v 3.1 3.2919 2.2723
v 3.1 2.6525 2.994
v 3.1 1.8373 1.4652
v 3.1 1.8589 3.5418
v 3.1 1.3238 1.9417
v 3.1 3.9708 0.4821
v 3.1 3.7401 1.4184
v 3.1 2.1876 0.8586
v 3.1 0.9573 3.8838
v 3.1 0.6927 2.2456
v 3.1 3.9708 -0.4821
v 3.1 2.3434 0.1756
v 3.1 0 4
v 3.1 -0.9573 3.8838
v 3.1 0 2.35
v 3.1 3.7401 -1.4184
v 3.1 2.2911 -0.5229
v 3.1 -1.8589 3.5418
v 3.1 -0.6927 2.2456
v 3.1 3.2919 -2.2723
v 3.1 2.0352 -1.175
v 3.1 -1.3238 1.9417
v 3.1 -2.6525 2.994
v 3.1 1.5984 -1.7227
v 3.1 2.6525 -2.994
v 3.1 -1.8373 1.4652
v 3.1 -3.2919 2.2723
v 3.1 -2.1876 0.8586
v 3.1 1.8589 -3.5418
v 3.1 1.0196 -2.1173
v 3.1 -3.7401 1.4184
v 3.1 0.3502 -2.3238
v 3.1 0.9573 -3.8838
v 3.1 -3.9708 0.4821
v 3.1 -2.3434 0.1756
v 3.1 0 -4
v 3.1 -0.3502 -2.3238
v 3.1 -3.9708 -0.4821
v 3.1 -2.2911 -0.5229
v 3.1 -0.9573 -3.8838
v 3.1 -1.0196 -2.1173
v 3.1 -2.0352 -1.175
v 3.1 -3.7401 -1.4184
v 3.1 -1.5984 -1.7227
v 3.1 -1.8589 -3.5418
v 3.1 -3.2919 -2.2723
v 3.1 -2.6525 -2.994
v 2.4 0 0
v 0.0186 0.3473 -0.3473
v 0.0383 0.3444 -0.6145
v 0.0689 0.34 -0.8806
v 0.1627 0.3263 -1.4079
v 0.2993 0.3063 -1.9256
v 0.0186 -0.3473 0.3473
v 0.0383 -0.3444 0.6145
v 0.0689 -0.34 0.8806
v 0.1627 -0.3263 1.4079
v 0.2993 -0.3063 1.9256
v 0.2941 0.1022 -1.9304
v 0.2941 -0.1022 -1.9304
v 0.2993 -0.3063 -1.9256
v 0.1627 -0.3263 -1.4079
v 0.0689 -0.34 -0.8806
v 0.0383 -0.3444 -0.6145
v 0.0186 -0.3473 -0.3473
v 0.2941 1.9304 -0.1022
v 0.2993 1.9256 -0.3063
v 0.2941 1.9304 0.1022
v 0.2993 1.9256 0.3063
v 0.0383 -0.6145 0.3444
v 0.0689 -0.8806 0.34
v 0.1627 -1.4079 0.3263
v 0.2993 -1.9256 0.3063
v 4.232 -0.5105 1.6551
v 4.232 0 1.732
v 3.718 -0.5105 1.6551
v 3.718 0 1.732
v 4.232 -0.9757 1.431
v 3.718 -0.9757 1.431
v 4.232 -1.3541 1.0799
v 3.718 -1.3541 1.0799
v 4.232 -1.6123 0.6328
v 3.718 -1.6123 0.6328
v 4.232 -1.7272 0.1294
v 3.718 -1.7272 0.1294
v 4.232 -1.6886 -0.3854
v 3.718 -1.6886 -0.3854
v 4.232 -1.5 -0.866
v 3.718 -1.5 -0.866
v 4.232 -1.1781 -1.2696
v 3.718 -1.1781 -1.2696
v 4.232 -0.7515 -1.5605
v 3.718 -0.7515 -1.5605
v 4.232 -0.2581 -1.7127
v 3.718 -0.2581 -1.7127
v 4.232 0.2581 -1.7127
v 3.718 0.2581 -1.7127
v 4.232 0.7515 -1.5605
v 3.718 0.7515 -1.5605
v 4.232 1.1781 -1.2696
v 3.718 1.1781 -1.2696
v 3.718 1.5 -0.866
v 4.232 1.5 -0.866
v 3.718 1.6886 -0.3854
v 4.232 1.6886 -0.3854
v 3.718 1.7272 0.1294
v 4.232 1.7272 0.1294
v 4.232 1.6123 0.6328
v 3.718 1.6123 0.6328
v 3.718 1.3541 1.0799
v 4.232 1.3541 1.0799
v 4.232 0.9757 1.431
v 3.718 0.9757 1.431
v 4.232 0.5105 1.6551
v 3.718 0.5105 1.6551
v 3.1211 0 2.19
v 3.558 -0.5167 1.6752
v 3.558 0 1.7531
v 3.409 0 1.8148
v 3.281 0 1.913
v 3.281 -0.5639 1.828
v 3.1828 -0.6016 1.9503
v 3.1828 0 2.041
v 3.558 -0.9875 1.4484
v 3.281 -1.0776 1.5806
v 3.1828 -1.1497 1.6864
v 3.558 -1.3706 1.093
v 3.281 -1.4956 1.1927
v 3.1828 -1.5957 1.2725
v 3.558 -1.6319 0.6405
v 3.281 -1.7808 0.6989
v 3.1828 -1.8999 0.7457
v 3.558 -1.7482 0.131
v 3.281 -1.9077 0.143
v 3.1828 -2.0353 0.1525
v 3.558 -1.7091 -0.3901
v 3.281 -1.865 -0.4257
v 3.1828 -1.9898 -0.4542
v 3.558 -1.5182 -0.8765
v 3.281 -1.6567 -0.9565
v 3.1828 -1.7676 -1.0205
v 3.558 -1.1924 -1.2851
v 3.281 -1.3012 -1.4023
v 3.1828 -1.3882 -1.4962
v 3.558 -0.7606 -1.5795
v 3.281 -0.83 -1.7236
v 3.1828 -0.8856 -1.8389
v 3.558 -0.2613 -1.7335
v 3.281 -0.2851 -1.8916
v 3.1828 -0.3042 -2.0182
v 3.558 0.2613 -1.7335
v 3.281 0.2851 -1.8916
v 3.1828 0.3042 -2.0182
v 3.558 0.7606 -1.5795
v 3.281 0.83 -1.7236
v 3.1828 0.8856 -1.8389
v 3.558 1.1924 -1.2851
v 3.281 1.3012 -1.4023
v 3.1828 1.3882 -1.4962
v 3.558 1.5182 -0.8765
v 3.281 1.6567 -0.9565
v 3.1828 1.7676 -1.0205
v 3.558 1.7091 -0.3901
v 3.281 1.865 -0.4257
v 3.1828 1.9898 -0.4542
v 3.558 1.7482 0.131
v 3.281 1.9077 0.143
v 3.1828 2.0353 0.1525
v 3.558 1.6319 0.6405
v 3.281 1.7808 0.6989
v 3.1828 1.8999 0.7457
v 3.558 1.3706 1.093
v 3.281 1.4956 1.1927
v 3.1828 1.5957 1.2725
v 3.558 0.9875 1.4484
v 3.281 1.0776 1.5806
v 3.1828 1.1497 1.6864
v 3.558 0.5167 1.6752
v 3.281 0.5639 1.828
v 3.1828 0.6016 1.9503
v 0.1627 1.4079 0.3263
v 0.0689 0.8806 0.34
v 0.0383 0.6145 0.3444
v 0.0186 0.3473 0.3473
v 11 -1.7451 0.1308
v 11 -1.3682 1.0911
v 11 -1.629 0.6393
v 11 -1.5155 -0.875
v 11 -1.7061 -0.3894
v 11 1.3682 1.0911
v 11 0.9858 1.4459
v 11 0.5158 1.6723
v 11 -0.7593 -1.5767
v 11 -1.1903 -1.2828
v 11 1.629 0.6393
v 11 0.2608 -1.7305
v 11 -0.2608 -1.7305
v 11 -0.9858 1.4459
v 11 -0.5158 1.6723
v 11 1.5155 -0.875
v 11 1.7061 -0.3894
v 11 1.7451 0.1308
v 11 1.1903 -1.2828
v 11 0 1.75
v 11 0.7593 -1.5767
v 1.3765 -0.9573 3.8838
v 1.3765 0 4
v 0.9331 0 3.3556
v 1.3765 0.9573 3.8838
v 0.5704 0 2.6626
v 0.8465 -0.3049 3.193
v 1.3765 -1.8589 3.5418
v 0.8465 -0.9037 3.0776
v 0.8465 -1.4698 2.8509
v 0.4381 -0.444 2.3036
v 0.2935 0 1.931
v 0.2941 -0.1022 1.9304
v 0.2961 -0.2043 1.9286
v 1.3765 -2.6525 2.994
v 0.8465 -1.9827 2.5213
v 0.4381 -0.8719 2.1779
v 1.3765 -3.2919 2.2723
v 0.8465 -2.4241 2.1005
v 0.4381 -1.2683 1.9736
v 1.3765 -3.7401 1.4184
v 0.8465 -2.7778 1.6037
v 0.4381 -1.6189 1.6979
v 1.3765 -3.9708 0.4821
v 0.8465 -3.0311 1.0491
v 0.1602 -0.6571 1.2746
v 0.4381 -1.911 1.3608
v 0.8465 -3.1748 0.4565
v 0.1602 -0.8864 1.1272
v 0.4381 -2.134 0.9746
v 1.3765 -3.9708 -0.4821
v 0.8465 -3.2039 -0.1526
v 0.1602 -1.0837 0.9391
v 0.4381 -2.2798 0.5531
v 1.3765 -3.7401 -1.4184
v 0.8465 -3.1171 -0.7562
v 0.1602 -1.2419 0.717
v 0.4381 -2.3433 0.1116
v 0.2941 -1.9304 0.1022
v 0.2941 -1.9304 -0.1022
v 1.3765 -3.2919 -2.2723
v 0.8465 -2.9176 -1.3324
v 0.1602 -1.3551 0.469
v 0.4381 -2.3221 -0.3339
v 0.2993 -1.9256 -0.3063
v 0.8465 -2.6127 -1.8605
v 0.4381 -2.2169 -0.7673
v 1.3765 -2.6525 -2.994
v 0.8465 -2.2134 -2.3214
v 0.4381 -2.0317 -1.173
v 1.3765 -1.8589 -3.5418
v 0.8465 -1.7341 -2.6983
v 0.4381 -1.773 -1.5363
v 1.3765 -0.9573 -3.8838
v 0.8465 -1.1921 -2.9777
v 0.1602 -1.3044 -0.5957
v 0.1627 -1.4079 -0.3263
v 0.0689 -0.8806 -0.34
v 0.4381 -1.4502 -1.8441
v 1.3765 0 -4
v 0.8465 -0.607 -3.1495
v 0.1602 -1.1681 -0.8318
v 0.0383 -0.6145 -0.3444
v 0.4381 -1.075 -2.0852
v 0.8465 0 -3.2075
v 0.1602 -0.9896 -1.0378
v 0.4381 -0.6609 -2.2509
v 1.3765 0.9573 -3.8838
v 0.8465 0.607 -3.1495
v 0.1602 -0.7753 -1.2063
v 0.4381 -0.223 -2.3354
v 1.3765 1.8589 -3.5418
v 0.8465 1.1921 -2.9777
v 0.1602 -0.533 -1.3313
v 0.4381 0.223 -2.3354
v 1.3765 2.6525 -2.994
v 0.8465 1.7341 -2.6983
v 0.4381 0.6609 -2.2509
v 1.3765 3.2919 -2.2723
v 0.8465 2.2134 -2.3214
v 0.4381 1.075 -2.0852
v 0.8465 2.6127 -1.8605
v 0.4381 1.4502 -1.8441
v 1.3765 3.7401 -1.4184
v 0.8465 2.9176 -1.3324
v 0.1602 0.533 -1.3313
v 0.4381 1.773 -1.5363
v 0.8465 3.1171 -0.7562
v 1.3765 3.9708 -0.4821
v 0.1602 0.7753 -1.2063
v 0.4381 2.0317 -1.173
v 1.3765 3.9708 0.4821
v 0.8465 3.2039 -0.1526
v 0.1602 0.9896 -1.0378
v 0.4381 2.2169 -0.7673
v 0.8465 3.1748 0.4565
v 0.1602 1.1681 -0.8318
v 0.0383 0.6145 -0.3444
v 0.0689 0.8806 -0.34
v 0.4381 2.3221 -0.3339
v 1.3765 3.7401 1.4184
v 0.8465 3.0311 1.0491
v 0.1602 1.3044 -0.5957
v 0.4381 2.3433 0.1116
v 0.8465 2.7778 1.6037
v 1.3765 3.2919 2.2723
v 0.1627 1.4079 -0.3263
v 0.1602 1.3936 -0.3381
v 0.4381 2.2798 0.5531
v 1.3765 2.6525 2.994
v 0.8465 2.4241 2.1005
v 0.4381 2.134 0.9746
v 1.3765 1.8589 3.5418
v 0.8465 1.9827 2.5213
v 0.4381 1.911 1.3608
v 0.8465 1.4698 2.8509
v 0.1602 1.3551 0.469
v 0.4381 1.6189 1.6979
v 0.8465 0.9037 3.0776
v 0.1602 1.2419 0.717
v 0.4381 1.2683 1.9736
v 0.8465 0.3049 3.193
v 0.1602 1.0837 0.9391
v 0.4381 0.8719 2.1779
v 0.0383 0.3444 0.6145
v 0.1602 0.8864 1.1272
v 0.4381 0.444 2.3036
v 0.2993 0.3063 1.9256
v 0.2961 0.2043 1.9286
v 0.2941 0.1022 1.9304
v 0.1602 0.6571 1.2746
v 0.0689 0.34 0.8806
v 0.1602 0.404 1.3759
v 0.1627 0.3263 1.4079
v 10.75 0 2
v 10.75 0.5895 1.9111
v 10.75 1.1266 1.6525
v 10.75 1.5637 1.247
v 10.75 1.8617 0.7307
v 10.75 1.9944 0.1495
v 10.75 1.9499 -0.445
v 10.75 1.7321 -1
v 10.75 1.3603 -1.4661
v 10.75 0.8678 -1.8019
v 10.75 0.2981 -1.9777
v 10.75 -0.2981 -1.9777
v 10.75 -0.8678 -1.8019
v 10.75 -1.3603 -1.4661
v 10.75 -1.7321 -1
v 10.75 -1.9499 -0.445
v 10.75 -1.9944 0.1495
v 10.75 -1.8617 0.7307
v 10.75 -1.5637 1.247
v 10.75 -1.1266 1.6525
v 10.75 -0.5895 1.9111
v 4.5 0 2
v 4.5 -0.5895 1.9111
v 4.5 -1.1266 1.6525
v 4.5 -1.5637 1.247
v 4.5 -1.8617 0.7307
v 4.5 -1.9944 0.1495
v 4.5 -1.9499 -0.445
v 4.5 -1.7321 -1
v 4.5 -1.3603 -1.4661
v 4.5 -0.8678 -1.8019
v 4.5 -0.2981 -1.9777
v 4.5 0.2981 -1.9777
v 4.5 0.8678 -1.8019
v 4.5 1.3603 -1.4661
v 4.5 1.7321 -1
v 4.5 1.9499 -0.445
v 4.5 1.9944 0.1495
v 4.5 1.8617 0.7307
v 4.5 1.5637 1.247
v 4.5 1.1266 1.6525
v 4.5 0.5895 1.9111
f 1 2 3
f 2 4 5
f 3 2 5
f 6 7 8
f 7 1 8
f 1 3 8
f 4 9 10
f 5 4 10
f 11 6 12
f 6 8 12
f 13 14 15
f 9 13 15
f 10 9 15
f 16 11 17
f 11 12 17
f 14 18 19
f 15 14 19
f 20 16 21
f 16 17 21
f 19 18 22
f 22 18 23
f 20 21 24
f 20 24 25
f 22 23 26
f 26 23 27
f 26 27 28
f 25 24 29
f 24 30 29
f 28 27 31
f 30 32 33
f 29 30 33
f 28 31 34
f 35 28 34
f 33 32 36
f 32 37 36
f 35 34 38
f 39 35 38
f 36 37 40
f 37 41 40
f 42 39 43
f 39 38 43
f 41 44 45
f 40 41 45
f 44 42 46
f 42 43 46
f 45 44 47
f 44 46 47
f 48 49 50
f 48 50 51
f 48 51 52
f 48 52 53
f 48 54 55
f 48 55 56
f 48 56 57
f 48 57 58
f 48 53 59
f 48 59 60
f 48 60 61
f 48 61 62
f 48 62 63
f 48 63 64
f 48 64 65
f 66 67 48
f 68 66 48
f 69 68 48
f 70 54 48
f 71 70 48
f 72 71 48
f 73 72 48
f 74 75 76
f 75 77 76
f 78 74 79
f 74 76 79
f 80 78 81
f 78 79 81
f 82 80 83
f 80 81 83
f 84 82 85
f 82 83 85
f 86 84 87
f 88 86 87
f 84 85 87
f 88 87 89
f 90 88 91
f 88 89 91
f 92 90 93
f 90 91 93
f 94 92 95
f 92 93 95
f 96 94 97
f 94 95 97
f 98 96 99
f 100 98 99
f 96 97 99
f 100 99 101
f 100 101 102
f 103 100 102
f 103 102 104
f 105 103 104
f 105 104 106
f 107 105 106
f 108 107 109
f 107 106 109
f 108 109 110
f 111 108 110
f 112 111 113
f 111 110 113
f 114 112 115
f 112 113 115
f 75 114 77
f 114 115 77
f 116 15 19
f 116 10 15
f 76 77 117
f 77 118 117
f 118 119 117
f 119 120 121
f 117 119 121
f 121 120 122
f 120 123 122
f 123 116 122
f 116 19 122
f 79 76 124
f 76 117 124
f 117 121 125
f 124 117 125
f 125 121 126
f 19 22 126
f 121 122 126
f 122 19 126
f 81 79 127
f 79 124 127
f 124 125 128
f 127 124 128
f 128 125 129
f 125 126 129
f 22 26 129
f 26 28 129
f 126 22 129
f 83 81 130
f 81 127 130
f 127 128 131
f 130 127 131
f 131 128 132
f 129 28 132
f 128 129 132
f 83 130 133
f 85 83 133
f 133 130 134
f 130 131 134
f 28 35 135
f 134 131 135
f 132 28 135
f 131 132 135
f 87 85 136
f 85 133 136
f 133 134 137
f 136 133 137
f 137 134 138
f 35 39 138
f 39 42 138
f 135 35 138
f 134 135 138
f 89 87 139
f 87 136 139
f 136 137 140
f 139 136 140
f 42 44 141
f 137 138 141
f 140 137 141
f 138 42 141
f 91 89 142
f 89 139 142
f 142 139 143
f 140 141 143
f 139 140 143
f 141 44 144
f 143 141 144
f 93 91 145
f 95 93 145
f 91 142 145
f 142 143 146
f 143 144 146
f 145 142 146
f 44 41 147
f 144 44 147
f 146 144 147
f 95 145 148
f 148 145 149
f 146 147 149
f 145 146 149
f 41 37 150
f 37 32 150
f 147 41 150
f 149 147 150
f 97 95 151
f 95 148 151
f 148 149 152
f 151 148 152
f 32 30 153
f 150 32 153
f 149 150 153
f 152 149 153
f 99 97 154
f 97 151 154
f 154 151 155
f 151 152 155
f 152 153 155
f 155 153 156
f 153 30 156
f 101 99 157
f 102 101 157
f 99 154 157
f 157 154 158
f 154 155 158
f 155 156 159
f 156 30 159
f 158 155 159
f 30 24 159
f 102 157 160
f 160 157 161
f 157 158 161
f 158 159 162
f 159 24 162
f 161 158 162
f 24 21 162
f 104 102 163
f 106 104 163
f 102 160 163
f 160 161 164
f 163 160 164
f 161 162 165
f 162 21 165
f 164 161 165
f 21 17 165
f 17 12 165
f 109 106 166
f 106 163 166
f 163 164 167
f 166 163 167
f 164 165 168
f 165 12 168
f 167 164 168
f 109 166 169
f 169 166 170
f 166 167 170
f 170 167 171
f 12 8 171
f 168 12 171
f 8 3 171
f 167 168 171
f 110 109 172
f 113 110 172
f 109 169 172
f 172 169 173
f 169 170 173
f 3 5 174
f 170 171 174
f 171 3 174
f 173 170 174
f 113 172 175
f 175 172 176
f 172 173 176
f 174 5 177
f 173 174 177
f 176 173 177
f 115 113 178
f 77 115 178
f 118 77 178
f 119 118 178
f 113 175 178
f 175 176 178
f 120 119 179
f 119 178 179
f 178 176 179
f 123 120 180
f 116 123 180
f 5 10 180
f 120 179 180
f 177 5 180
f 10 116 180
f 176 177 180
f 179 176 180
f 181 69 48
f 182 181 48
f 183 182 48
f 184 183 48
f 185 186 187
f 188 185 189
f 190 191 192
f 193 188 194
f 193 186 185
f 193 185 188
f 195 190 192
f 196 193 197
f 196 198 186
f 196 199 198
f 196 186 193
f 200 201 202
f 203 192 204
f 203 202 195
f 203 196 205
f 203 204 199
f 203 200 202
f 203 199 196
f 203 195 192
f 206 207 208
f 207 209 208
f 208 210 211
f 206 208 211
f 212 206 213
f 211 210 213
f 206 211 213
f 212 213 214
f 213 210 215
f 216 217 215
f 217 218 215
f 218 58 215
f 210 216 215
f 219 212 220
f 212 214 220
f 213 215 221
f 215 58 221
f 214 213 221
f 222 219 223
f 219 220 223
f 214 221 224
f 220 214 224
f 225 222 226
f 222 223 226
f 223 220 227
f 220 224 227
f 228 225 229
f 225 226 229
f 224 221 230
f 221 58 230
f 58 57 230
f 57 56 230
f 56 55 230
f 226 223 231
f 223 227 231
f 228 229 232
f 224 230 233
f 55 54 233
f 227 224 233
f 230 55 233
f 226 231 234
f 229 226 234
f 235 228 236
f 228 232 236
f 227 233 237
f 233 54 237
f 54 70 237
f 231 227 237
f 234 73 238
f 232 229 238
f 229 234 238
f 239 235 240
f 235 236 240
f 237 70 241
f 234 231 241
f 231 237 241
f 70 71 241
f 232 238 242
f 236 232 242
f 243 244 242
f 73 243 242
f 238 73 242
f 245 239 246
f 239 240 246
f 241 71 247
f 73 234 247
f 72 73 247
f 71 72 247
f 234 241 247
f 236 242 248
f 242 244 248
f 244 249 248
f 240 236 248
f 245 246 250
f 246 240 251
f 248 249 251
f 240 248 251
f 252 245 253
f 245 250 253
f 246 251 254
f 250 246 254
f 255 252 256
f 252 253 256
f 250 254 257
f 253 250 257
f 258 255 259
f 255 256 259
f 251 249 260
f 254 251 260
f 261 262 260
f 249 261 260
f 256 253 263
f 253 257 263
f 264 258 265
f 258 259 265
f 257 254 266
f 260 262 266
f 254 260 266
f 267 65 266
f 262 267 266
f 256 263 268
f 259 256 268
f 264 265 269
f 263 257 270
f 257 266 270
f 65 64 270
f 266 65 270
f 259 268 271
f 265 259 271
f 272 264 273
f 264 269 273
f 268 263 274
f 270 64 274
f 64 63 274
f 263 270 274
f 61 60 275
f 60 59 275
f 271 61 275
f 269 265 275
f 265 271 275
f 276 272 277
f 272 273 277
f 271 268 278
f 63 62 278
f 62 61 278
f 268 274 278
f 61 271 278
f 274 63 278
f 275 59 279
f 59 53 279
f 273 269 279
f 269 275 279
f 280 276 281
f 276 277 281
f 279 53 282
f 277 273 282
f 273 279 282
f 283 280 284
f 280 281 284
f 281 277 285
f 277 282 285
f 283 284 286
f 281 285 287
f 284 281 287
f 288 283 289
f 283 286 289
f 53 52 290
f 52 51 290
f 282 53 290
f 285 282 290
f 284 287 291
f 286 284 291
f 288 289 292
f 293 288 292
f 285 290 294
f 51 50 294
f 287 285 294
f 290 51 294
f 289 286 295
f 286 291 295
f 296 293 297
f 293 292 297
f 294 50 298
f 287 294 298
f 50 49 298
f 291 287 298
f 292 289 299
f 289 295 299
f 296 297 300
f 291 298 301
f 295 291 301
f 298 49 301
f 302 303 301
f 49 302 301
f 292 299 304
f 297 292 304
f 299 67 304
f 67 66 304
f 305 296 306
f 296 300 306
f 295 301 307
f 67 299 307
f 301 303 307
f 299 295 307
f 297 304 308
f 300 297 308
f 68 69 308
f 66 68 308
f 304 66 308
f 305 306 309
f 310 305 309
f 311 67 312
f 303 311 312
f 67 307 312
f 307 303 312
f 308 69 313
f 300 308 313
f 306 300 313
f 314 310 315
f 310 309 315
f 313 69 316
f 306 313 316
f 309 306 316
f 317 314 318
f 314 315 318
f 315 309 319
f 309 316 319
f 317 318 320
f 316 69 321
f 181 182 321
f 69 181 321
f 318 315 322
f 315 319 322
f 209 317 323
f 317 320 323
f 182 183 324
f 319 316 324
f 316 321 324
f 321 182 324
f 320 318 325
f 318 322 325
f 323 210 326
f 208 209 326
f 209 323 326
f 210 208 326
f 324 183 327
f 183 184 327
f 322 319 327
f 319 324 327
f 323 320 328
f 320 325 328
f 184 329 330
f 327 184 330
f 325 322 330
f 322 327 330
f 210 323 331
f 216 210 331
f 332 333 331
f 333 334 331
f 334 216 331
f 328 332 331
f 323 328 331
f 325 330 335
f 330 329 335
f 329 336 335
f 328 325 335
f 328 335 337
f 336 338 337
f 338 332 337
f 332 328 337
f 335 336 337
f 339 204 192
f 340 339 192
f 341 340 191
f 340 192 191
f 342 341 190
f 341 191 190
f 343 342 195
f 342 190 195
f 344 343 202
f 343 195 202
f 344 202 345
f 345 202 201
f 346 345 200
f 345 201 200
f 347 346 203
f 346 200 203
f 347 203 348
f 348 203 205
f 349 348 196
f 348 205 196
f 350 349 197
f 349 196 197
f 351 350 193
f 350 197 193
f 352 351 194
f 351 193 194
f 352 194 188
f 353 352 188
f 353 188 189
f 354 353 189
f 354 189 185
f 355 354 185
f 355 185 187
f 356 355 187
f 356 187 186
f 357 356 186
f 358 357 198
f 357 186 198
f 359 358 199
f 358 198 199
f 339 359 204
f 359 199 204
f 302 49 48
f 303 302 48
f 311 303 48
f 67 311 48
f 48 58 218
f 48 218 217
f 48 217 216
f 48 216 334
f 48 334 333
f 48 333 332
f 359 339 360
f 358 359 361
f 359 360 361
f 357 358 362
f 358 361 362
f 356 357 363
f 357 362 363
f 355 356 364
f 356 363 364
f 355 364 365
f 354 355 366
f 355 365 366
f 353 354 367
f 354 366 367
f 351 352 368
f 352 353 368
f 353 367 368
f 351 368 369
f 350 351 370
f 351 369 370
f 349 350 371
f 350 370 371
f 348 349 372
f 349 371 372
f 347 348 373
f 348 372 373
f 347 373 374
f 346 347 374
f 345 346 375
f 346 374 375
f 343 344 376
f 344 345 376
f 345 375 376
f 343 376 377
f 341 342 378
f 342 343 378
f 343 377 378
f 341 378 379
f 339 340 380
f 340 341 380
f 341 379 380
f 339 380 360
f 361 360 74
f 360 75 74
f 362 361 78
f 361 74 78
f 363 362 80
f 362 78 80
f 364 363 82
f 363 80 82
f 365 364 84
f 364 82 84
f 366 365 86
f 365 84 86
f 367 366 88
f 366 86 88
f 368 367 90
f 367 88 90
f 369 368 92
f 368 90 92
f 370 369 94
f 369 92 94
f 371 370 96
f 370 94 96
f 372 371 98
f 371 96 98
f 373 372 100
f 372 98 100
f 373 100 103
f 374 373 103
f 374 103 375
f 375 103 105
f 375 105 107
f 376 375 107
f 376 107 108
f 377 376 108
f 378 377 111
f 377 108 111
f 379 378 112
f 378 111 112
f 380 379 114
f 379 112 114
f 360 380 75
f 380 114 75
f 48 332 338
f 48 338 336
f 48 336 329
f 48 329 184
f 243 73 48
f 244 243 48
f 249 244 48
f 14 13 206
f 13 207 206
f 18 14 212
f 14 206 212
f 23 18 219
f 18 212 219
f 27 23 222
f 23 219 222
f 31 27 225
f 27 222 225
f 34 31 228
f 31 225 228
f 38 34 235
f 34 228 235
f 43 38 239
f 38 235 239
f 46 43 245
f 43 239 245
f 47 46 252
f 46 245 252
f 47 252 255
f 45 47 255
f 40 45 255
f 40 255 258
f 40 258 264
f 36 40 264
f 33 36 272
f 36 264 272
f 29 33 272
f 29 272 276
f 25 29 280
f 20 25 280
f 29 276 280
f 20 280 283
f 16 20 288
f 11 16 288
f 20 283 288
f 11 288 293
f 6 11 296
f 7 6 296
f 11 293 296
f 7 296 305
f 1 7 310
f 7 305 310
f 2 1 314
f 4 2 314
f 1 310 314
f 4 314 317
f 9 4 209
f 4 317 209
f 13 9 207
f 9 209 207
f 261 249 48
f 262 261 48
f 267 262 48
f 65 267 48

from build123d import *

# Parameters (mm, degrees)
SKETCH_7_W          = 8.1700084
SKETCH_7_H          = 5.261512758
CUT_EXTRUDE_1_DEPTH = 5
CHAMFER_1_SIZE      = 0.25


with BuildPart() as part:
    # 草图2 → Revolve 707 (revolve)
    with BuildSketch(Plane.XY, mode=Mode.PRIVATE) as revolve_707_sk:
        with BuildLine():
            Line((0, 0), (17.1, 0))
            Line((17.1, 0), (17.1, 2))
            Line((17.1, 2), (4.5, 2))
            Line((4.5, 2), (4.232, 1.732))
            Line((4.232, 1.732), (3.718, 1.732))
            ThreePointArc((3.718, 1.732), (3.281008009, 1.913008009), (3.1, 2.35))
            Line((3.1, 2.35), (3.1, 4))
            Line((3.1, 4), (1.376524617, 4))
            ThreePointArc((1.376524617, 4), (0.353757652, 2.115113473), (0, 0))
        make_face()
    revolve(revolve_707_sk.sketch.rotate(Axis((-1.331757704, 0, 0), (1, 0, 0)), 90), axis=Axis((-1.331757704, 0, 0), (1, 0, 0)))

    # 草图3 → 切除-旋转1 (revolve, cut)
    with BuildSketch(Plane.XY, mode=Mode.PRIVATE) as cut_revolve_1_sk:
        Polygon((16.753791204, 2), (17.453791204, 2), (17.1, 1.3938), align=None)
    revolve(cut_revolve_1_sk.sketch.rotate(Axis((-0.242766179, 0, 0), (1, 0, 0)), 90), axis=Axis((-0.242766179, 0, 0), (1, 0, 0)), mode=Mode.SUBTRACT)

    # 草图5 → 切除-放样1 section 0
    with BuildSketch(Plane(origin=(0, 0, 0), x_dir=(0, 0, -1), z_dir=(1, 0, 0)), mode=Mode.PRIVATE) as loft_1_s0:
        with BuildLine():
            Line((0.35, 2.2), (-0.35, 2.2))
            Line((-0.35, 2.2), (-0.35, -2.2))
            Line((-0.35, -2.2), (0.35, -2.2))
            Line((0.35, -2.2), (0.35, 2.2))
        make_face()
    loft_1 = loft([Vertex(2.4, 0, 0), loft_1_s0.sketch], mode=Mode.SUBTRACT)

    # 镜向1: 切除-放样1 across plane
    add(loft_1.mirror(Plane(origin=(0, 0, 0), x_dir=(0, 0.7071067811865462, 0.7071067811865488), z_dir=(0, -0.7071067811865488, 0.7071067811865462))), mode=Mode.SUBTRACT)

    # 草图7 → 切除-拉伸1 (cut, symmetric)
    with BuildSketch(Plane(origin=(0, 0, 0), x_dir=(1, 0, 0), z_dir=(0, 1, 0))):
        with Locations((15.0850042, 0.359536705)):
            Rectangle(SKETCH_7_W, SKETCH_7_H)
    extrude(amount=CUT_EXTRUDE_1_DEPTH, both=True, mode=Mode.SUBTRACT)

    # 倒角1
    chamfer_1_edges = [part.edges().sort_by_distance(p)[0] for p in [
        (11, 0, -2),
    ]]
    chamfer(chamfer_1_edges, length=CHAMFER_1_SIZE)


solid = part.part
